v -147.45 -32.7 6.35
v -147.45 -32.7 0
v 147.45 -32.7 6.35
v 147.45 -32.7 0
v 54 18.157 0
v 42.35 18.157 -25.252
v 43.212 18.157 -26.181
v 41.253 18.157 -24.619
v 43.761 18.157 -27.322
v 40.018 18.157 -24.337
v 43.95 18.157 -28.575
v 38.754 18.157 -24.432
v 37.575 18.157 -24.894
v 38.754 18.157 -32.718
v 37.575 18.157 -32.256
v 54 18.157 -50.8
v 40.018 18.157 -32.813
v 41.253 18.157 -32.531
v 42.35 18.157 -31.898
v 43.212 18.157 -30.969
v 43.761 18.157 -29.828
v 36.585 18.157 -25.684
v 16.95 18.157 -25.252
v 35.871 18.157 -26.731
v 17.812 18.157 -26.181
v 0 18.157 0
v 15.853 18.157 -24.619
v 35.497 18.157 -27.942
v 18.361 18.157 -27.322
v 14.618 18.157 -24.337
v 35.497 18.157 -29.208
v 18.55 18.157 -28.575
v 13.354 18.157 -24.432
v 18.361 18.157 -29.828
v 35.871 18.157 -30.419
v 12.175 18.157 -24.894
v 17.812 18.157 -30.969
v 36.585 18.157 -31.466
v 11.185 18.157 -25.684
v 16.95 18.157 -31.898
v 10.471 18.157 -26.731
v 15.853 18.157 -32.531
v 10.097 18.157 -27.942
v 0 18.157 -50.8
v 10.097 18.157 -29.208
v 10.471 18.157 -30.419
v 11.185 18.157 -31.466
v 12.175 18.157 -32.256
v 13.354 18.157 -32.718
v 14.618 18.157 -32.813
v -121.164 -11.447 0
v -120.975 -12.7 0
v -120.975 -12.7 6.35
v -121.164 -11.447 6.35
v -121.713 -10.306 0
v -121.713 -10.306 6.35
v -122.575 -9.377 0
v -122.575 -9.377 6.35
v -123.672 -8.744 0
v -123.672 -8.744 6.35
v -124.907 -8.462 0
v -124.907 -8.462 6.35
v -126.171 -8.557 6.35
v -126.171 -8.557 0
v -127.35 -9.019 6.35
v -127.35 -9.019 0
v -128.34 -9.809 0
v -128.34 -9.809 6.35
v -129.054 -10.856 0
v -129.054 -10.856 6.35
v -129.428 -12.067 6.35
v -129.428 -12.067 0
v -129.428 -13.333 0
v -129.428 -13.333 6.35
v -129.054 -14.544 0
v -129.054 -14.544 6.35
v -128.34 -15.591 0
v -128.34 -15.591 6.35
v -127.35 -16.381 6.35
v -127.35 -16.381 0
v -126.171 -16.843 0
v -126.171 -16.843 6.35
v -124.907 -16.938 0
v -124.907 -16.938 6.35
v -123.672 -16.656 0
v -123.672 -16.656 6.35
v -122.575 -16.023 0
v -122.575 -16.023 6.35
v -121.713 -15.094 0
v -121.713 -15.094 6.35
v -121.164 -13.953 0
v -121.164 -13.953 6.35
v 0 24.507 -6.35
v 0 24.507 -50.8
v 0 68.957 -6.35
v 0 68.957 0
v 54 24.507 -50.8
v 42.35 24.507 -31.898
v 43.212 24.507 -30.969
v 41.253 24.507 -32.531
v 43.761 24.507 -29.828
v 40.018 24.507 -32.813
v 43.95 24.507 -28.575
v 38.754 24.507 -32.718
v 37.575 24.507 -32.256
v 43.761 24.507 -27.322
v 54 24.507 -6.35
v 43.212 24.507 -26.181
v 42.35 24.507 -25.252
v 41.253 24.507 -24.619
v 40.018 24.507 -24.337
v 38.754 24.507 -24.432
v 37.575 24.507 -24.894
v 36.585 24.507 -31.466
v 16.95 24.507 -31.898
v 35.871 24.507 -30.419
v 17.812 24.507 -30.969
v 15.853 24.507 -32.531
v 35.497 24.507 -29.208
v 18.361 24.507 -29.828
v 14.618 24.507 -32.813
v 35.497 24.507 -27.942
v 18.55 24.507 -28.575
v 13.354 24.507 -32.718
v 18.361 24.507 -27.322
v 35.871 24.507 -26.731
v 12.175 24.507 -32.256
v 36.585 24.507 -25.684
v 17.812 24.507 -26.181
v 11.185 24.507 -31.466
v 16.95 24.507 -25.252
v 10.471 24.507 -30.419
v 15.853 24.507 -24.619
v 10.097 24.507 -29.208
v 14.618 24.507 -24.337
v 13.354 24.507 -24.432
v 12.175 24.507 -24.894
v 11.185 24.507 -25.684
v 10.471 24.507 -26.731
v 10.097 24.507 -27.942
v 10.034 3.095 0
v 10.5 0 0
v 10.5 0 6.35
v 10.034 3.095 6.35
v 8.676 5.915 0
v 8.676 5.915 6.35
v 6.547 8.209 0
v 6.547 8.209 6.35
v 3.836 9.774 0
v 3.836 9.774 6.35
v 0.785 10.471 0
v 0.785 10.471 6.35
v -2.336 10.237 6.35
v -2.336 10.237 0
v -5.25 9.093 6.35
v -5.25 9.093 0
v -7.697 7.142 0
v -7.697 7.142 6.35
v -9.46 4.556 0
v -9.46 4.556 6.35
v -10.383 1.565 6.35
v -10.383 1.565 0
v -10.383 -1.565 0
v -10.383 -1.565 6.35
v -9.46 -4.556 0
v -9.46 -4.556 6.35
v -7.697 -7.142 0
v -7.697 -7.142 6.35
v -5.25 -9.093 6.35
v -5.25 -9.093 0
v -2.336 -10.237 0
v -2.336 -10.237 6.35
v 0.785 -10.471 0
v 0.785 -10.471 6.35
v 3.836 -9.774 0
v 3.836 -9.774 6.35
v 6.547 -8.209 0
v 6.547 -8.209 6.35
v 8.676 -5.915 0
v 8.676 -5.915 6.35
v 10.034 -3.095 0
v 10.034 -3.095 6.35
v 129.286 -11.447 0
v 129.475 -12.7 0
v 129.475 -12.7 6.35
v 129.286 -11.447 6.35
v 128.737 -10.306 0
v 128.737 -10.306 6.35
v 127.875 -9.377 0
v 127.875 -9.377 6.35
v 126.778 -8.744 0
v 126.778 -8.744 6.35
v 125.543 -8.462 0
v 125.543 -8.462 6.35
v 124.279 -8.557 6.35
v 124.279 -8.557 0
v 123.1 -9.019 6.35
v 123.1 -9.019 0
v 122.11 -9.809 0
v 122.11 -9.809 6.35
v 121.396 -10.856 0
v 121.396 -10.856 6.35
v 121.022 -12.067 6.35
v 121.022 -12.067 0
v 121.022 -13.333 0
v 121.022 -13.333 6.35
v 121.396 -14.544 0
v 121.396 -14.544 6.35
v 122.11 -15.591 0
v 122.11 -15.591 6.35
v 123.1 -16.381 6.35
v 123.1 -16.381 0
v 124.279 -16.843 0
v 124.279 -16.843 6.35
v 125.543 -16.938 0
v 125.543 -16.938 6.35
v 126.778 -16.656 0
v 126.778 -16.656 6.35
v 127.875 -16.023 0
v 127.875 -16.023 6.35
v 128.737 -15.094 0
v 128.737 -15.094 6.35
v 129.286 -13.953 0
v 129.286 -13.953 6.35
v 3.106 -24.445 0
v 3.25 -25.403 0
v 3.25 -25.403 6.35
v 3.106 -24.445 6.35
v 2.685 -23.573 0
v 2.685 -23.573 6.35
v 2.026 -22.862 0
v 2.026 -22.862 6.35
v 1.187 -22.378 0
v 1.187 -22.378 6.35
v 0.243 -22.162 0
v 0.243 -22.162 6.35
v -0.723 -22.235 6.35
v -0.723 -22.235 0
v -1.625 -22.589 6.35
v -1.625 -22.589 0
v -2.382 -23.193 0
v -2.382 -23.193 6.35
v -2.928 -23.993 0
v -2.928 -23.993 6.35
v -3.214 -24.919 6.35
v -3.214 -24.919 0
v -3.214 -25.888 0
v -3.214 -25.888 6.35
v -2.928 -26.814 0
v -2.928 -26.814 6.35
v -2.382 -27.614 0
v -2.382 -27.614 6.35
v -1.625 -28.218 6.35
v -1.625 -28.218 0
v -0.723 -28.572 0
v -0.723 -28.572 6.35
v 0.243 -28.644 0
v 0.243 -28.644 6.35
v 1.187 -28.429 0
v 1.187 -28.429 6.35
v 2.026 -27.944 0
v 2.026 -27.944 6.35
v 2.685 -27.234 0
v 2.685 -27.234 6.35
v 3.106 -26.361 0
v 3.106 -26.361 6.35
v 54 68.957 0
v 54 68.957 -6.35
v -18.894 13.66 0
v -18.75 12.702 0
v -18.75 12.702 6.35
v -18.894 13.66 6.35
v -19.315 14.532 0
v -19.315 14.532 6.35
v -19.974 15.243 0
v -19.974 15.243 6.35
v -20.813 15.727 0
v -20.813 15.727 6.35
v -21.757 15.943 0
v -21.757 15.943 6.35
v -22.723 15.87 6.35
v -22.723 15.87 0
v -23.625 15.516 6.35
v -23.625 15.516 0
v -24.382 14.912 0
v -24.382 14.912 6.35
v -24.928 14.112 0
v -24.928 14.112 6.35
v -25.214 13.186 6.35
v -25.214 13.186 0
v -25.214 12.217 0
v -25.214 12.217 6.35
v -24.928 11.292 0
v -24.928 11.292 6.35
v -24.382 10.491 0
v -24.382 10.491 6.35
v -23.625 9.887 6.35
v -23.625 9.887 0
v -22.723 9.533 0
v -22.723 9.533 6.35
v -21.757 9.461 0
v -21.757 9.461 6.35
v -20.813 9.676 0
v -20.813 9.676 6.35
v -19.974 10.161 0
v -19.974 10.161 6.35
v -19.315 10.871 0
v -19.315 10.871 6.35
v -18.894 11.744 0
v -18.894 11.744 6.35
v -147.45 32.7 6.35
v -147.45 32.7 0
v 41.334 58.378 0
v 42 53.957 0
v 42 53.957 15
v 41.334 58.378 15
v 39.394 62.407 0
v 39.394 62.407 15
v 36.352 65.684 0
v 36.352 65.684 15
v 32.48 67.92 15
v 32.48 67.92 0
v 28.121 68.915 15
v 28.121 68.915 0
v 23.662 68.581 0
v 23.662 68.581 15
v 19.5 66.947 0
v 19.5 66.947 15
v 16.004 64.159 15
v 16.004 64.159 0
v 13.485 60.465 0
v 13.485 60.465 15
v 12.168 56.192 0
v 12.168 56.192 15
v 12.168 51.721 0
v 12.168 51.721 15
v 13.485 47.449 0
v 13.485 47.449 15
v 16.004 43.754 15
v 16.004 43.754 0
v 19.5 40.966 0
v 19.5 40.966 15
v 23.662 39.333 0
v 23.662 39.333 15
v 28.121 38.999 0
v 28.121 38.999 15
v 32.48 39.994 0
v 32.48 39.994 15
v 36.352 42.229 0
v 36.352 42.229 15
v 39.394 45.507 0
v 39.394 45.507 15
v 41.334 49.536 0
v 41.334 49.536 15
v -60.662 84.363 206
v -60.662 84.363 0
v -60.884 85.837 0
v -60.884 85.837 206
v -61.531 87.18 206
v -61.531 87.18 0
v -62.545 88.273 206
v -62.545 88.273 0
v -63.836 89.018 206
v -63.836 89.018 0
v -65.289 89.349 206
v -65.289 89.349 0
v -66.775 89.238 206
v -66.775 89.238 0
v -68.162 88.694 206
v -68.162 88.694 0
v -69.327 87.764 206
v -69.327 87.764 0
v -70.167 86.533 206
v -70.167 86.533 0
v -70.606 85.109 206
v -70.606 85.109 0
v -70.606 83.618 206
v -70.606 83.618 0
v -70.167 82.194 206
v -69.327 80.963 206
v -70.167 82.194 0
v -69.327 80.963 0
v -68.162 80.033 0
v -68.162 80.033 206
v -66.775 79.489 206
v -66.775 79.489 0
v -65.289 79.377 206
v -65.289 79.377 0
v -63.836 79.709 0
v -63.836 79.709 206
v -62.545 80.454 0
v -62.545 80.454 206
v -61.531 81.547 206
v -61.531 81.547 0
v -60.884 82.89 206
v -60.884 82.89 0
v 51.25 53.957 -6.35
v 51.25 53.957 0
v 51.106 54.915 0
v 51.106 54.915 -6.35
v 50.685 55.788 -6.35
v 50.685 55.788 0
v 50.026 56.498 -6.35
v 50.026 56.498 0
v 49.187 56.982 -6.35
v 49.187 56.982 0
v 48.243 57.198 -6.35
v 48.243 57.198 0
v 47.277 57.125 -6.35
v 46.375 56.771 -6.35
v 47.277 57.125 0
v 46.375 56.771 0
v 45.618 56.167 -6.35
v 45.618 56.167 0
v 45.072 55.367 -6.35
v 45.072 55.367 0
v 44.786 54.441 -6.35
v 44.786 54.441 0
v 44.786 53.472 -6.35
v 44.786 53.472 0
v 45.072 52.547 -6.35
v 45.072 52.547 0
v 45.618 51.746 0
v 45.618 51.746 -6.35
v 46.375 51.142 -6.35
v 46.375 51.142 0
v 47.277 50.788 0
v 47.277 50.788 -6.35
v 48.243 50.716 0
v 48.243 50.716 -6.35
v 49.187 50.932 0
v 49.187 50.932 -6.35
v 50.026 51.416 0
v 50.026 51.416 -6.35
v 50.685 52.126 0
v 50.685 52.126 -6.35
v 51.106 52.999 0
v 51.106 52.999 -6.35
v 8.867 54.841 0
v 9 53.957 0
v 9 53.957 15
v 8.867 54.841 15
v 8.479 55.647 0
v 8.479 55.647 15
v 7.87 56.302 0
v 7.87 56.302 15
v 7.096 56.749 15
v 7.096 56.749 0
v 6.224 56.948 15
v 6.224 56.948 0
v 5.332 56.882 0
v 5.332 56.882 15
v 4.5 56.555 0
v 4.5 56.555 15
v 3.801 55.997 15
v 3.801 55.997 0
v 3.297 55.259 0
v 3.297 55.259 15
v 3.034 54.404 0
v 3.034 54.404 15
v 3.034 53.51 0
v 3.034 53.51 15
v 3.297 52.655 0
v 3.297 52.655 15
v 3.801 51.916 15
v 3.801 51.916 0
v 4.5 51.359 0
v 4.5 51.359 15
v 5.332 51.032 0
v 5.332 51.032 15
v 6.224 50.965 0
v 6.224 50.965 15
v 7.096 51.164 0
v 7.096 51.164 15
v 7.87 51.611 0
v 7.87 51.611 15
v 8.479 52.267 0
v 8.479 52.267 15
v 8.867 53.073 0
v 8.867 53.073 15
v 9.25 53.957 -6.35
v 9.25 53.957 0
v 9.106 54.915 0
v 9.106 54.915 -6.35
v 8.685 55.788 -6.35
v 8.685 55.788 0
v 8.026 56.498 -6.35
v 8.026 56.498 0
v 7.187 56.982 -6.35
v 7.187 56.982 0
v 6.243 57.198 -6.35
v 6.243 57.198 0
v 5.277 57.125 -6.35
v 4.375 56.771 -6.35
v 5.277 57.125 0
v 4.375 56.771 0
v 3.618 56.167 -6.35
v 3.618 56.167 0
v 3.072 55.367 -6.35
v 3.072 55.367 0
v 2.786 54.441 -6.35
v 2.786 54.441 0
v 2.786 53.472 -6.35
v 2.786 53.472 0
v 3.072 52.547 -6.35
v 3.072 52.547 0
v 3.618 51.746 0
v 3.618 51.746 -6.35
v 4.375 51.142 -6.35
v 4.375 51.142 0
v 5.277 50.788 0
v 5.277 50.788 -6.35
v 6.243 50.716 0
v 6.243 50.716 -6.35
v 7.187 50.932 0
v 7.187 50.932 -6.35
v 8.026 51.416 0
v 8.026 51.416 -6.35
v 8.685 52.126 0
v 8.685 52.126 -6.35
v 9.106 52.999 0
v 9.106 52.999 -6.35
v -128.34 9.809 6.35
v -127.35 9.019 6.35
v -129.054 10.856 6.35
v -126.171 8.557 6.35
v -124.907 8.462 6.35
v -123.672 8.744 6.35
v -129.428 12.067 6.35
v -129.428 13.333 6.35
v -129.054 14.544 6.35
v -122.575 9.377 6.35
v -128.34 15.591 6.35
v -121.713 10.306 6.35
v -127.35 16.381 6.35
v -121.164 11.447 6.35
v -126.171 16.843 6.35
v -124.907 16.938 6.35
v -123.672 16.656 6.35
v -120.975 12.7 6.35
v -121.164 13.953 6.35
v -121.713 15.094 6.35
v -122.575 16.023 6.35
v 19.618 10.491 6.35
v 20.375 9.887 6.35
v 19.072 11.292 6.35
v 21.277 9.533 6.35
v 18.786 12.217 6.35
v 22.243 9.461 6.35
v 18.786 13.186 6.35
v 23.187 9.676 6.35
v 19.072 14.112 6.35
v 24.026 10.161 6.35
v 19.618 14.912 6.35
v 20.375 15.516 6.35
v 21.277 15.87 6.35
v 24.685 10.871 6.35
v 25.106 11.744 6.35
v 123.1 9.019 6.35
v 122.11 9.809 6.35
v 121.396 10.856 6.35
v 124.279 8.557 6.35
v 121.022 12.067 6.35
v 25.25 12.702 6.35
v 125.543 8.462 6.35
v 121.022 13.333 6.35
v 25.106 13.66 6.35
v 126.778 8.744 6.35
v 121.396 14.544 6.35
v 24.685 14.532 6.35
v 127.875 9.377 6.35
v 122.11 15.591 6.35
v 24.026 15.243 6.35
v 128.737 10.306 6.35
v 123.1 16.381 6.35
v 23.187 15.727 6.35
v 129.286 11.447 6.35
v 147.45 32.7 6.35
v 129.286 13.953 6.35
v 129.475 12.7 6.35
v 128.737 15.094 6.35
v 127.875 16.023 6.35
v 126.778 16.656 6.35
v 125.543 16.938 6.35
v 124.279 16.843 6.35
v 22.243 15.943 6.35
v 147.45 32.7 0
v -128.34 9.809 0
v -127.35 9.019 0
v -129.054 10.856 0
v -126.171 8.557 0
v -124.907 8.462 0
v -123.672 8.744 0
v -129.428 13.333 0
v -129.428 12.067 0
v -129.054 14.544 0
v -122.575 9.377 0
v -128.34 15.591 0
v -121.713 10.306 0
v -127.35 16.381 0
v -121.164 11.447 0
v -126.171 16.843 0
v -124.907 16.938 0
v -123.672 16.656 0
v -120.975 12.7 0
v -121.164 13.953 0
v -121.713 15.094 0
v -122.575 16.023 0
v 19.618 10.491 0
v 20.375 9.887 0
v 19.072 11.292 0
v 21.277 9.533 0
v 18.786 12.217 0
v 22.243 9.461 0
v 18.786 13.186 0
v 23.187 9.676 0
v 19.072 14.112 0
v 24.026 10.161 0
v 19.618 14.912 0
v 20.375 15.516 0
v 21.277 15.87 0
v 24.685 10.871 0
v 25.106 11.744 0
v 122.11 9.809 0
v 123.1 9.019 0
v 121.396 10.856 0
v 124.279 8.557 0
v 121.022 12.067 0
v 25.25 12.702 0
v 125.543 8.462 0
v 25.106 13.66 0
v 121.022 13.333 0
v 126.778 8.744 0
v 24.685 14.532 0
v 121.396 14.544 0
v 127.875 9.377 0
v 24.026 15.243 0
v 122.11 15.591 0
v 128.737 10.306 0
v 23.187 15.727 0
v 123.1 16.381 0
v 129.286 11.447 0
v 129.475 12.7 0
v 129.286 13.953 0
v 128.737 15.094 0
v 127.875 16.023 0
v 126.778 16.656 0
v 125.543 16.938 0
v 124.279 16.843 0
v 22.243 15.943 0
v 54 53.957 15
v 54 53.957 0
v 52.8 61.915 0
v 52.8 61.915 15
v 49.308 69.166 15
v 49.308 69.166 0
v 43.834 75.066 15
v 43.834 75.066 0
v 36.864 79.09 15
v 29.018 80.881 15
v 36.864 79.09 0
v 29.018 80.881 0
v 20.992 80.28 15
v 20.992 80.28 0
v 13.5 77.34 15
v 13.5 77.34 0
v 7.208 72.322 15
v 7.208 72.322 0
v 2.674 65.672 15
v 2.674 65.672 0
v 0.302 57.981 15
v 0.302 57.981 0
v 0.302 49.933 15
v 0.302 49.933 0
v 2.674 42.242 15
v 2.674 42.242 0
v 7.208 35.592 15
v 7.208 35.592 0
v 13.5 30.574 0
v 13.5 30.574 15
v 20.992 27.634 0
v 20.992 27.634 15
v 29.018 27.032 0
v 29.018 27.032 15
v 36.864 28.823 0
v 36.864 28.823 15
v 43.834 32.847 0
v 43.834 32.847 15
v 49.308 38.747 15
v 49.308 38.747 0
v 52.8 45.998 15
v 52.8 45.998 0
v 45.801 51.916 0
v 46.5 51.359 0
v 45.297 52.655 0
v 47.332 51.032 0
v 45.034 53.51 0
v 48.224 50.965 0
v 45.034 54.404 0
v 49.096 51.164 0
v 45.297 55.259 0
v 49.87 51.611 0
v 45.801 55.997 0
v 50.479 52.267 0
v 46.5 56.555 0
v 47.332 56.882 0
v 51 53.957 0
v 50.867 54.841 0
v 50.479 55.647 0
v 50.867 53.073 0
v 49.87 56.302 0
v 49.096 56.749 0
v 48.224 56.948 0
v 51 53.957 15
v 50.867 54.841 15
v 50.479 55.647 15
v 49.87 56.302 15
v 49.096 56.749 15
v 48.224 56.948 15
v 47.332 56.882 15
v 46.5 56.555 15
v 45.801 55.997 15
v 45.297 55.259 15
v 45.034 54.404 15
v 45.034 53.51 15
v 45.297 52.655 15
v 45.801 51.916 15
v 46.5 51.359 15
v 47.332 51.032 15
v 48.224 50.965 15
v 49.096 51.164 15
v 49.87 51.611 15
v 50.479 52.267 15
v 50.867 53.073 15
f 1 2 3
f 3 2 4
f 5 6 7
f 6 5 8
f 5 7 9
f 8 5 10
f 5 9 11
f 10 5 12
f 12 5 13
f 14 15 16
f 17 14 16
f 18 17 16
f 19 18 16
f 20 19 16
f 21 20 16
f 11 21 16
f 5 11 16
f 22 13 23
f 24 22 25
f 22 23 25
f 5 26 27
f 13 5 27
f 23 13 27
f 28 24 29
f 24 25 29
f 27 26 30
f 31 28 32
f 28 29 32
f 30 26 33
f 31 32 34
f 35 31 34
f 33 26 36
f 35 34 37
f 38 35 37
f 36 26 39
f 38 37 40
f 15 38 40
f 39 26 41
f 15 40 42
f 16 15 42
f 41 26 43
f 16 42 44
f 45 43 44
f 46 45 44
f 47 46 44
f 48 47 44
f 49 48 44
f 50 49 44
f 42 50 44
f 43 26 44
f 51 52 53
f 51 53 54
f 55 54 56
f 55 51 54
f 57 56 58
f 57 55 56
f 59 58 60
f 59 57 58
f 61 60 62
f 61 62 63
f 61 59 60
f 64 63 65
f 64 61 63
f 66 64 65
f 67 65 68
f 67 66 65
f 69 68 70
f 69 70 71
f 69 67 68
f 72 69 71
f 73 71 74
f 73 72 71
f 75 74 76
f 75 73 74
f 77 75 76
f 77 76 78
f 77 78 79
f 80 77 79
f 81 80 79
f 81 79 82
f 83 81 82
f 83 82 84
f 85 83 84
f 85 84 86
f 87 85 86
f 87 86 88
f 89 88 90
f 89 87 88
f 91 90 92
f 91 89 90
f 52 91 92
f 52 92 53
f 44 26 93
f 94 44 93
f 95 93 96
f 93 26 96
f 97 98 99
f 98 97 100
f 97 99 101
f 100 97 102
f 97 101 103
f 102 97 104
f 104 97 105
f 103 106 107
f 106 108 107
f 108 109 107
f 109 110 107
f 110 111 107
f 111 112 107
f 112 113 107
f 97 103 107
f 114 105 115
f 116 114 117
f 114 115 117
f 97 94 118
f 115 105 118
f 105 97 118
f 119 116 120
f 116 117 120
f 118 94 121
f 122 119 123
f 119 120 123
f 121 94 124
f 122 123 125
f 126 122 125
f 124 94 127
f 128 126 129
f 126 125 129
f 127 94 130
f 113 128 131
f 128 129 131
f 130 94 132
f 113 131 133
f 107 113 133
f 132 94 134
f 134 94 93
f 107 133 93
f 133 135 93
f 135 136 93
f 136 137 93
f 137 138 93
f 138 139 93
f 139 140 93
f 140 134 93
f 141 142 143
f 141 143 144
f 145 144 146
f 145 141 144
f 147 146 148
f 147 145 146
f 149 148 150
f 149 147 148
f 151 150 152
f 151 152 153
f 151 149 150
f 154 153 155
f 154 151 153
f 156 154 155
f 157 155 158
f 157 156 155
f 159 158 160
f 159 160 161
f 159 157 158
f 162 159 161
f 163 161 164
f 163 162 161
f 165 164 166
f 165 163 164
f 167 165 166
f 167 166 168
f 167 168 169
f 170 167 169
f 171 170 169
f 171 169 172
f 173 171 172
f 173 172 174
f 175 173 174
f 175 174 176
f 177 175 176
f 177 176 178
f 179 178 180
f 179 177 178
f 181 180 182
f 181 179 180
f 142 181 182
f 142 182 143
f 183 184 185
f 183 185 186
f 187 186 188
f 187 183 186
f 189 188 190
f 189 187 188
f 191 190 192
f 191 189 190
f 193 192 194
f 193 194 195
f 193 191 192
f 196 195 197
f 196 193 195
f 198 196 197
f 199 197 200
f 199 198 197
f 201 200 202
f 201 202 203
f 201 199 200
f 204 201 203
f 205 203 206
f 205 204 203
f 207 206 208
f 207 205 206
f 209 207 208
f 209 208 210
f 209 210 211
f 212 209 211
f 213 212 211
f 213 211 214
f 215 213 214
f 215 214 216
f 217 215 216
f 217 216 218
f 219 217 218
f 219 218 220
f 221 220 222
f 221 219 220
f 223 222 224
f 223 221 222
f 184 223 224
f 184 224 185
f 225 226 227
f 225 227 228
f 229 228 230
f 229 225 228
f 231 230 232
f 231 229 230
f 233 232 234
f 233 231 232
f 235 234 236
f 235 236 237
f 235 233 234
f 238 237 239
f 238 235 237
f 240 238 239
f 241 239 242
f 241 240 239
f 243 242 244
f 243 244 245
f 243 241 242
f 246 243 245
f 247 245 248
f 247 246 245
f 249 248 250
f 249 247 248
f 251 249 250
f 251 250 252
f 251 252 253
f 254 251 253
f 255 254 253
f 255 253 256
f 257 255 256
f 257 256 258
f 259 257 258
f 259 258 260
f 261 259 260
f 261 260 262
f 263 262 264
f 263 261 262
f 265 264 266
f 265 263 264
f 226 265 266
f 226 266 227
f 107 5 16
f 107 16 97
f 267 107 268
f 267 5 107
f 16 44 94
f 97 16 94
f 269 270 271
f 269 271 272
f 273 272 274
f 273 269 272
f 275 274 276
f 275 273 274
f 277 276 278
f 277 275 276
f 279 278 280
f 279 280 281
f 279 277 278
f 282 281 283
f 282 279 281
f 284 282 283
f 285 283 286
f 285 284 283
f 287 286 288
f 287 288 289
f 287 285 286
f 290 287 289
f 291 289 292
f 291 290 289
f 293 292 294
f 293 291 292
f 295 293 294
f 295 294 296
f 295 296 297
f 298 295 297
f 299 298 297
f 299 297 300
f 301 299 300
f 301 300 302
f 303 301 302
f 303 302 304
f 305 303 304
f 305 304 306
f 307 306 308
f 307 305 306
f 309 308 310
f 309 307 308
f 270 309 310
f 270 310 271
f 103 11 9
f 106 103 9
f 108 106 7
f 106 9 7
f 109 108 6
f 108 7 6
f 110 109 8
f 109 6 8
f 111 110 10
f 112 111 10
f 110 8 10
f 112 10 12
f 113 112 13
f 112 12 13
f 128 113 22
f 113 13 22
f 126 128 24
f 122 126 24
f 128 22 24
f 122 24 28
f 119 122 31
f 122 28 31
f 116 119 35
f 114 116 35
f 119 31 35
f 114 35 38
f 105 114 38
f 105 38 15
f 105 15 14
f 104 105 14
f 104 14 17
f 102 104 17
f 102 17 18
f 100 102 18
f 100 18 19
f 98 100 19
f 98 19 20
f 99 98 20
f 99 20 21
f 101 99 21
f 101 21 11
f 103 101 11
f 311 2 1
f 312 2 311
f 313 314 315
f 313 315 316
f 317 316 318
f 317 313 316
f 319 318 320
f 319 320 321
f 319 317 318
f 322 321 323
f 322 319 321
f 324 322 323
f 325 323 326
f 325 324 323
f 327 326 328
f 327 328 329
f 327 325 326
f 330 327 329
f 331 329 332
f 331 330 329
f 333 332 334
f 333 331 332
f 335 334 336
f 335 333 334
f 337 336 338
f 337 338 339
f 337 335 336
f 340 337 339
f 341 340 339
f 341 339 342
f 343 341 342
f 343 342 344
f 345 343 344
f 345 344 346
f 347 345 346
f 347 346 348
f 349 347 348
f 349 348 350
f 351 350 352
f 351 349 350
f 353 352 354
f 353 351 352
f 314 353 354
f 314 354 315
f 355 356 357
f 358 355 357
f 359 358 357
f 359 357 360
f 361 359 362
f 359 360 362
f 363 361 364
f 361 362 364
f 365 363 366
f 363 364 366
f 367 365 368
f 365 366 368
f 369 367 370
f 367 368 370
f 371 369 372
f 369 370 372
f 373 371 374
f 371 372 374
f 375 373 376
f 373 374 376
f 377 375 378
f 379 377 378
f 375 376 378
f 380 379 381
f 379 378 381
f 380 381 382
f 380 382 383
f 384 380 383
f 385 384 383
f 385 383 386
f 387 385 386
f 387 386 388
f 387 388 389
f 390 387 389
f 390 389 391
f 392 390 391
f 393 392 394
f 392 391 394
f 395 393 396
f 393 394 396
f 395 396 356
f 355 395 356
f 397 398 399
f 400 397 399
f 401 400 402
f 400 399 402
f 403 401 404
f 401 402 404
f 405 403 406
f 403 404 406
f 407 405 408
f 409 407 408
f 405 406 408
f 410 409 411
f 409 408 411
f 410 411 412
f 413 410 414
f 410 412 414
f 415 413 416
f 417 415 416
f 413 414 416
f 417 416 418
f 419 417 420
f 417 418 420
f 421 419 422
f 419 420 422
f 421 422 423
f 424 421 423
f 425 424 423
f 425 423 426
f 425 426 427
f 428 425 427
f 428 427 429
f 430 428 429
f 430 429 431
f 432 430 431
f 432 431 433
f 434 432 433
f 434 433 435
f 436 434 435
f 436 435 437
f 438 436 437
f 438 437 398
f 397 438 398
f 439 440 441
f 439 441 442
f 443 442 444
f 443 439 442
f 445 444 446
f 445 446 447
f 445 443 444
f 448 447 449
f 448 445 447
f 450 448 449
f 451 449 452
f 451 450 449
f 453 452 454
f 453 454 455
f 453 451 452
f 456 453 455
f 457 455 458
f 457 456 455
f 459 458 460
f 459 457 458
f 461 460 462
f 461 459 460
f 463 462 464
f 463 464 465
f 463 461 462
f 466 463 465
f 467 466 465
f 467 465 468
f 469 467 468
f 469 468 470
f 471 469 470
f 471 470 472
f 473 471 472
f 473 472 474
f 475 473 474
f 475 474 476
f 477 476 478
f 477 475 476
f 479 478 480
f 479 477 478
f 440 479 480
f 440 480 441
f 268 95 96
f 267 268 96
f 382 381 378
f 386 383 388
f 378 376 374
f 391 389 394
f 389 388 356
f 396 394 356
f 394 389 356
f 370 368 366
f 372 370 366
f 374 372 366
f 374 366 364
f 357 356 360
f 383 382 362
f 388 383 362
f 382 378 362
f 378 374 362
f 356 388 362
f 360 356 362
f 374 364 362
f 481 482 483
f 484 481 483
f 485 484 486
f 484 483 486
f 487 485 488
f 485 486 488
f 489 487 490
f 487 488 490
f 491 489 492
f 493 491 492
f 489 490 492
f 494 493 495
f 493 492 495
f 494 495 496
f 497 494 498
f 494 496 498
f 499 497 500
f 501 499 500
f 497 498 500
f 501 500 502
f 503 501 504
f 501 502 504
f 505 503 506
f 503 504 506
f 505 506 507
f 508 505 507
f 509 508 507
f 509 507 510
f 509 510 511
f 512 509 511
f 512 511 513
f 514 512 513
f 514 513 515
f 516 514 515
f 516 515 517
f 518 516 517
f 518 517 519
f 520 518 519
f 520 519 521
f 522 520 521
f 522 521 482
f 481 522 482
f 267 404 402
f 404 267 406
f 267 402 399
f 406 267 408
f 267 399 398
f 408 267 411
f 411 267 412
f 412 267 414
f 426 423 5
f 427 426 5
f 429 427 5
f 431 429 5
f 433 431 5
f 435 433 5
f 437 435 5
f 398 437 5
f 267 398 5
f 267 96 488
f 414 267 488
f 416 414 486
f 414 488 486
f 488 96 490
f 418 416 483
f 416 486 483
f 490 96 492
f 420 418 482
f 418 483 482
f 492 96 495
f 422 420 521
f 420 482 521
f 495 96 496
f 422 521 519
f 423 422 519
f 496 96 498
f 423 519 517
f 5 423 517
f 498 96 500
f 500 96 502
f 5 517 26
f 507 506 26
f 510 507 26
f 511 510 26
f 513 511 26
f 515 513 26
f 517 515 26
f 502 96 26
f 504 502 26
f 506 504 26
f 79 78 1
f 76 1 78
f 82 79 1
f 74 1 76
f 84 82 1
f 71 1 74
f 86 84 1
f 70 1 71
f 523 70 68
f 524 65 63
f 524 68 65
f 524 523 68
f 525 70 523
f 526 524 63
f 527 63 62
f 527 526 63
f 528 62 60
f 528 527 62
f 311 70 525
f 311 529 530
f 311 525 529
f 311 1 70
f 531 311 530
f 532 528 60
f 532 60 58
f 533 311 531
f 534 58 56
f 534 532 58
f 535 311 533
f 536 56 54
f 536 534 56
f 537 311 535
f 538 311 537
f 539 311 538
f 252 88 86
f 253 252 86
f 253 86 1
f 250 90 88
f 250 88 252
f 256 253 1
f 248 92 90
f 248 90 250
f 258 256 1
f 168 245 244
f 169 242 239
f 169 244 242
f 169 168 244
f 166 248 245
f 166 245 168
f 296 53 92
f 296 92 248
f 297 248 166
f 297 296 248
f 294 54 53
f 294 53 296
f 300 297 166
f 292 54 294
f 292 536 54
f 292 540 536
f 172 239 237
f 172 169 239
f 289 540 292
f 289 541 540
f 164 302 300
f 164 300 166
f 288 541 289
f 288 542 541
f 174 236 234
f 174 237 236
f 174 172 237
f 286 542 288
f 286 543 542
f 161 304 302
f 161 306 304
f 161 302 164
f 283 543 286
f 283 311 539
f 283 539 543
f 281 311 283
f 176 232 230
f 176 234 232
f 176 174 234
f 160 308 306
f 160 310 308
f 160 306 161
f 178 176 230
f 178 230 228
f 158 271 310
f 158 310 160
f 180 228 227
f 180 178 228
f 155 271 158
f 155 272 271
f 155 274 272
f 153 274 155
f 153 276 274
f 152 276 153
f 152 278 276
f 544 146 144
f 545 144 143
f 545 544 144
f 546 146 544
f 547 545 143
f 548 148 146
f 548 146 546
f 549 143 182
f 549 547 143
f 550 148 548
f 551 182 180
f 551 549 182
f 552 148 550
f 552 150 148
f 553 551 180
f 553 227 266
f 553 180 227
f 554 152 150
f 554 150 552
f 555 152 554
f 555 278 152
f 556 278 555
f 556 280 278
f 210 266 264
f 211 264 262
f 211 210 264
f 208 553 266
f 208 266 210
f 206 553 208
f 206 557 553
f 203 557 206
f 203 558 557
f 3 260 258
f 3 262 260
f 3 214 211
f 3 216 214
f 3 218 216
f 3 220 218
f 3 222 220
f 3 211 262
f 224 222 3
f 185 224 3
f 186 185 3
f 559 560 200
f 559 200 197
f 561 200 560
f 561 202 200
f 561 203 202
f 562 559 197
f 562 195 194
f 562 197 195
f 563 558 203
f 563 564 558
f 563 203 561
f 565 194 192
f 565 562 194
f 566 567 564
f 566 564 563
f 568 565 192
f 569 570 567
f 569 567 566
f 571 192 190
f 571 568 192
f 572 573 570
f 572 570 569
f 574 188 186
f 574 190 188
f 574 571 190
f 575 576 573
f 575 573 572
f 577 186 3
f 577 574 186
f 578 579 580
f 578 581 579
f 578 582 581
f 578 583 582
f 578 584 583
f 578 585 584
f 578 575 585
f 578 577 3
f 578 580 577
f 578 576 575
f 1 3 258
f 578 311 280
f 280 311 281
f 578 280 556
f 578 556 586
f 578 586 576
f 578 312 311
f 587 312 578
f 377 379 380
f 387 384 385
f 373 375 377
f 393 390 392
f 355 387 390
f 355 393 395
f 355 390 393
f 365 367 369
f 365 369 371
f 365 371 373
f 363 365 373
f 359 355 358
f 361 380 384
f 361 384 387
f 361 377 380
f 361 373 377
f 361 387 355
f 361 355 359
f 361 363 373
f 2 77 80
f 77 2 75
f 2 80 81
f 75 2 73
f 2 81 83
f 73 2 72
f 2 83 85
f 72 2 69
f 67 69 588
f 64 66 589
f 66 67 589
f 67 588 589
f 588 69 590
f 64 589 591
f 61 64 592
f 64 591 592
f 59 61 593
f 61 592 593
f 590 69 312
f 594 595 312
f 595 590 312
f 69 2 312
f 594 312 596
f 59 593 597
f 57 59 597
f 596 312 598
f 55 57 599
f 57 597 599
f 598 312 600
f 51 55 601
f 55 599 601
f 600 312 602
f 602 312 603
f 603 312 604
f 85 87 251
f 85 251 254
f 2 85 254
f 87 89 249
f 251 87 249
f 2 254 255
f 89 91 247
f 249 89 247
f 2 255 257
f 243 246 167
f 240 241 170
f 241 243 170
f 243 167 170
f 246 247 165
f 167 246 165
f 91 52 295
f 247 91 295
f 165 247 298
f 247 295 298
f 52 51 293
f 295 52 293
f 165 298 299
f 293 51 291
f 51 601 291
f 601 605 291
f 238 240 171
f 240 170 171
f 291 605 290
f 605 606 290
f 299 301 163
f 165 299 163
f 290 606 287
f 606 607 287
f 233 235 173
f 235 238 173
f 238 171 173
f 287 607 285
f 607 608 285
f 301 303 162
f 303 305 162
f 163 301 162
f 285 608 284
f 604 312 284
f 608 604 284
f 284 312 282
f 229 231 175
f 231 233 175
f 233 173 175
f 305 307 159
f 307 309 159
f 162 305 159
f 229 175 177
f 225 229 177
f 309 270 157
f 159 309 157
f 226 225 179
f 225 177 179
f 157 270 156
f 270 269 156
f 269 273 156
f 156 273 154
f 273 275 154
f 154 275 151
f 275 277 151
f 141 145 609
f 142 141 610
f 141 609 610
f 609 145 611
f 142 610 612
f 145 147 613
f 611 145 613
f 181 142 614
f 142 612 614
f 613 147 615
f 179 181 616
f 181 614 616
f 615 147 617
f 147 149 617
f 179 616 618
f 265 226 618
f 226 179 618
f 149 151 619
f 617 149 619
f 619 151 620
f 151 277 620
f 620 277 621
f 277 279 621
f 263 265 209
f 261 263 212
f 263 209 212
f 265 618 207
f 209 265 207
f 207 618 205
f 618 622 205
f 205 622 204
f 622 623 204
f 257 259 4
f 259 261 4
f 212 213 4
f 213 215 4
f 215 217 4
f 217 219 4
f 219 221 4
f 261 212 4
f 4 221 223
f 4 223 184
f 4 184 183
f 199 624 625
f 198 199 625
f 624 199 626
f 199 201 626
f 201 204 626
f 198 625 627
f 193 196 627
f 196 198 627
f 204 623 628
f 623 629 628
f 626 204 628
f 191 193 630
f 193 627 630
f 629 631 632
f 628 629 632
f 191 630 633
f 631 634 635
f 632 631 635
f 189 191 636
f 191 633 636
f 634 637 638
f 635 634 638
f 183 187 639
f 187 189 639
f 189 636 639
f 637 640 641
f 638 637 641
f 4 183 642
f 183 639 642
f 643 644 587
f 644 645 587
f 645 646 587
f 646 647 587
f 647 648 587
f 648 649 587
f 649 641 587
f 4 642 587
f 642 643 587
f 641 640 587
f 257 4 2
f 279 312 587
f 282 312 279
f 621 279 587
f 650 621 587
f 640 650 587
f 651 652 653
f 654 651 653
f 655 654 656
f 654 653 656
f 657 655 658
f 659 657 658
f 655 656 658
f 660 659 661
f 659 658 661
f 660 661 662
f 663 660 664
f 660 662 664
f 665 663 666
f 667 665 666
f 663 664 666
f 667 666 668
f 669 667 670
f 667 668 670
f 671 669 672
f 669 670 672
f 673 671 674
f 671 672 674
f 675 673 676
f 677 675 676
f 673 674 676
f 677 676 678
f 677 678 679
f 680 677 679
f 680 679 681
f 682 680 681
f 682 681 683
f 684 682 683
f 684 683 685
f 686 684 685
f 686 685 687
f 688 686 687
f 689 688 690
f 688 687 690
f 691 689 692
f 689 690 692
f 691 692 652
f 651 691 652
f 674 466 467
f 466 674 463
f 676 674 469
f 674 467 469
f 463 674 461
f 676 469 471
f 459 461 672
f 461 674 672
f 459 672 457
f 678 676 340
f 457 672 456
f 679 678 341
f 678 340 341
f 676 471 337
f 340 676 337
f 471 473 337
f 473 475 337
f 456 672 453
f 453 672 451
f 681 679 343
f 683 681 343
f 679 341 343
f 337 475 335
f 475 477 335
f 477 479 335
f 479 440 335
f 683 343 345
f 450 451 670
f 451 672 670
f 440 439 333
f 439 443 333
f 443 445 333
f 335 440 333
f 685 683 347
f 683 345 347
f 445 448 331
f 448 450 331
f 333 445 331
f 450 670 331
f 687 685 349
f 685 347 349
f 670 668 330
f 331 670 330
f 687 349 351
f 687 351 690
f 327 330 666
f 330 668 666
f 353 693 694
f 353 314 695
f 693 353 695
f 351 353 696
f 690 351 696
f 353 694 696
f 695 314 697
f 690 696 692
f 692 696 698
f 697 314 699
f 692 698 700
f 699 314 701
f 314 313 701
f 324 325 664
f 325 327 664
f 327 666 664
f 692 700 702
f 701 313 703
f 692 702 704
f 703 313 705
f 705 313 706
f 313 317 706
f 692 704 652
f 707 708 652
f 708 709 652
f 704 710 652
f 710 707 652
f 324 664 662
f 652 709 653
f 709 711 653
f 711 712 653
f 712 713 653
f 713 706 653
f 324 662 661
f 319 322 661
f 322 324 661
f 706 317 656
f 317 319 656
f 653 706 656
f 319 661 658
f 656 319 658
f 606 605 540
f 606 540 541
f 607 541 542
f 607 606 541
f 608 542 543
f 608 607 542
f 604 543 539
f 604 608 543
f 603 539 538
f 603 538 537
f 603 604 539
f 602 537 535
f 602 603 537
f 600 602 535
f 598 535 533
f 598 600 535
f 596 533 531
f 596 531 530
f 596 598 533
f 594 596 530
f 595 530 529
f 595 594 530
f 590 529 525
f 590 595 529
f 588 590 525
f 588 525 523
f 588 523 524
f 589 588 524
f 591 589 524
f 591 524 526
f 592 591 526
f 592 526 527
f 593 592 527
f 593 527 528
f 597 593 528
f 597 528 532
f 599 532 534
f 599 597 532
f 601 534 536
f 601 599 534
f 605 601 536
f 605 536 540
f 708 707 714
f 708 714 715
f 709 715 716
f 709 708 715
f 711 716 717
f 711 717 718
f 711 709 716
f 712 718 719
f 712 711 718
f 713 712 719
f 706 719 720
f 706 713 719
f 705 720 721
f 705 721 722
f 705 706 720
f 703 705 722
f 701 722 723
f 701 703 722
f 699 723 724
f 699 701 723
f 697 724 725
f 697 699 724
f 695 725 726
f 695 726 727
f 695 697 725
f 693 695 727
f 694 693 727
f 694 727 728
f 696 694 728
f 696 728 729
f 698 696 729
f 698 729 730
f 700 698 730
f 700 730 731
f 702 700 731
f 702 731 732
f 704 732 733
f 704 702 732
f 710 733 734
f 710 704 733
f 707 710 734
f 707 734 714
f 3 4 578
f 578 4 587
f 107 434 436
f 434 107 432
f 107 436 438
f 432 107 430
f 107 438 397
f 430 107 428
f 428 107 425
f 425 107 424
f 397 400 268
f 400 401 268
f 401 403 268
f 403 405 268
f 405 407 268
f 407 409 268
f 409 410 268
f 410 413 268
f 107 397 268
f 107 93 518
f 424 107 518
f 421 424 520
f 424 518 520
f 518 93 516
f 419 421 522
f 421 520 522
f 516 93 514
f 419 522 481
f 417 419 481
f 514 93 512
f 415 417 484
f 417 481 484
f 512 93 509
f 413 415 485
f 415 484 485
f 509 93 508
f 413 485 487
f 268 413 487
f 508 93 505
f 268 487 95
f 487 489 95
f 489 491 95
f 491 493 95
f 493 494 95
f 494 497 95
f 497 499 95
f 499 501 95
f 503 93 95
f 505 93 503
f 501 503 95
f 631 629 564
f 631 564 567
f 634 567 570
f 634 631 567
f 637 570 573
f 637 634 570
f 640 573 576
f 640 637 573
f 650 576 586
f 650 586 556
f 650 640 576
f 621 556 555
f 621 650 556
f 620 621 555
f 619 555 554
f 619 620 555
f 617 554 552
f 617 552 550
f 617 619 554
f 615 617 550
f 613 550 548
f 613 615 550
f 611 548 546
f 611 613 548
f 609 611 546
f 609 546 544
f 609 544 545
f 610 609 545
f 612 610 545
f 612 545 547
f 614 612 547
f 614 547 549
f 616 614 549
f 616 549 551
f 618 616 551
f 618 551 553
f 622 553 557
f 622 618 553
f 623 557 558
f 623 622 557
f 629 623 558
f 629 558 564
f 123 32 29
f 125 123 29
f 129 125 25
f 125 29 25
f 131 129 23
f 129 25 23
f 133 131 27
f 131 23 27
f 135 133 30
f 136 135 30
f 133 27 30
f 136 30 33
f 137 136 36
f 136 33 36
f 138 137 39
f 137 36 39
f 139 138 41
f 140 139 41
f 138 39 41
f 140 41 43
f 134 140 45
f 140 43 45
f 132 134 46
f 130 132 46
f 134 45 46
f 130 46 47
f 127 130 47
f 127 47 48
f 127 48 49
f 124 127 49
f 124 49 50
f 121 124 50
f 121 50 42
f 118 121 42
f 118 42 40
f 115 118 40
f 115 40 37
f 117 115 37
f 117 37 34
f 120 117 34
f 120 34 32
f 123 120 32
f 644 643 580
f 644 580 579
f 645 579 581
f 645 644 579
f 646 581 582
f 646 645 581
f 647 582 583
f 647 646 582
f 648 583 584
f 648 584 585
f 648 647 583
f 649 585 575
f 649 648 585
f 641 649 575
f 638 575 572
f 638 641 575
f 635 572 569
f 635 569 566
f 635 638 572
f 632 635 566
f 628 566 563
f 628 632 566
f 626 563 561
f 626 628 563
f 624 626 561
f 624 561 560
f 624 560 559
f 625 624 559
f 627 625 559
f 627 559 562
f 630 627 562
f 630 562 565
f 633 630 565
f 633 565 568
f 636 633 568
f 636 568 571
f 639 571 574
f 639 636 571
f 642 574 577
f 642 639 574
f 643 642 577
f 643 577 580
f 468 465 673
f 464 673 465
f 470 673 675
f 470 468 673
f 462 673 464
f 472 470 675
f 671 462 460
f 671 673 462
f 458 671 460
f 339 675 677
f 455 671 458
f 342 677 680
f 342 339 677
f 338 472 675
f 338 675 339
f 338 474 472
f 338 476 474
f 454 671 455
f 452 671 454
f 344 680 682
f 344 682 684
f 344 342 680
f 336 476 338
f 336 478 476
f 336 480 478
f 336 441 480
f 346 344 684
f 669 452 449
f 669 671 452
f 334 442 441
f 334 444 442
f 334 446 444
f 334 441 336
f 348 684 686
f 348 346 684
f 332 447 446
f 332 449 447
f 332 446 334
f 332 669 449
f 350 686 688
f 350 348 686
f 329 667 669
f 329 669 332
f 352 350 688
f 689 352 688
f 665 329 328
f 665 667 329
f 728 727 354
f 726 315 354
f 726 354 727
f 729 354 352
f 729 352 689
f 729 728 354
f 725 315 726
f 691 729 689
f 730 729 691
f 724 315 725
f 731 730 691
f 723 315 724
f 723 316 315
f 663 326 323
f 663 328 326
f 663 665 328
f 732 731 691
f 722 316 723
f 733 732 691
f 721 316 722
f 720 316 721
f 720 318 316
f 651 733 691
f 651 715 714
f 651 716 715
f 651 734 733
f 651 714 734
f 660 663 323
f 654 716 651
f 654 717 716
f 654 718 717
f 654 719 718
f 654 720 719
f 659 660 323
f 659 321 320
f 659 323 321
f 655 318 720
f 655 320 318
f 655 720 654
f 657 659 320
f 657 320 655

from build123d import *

# Parameters (mm, degrees)
F1_R      = 27
F1_R_2    = 3
F1_R_3    = 15
F2_DEPTH  = 15
F3_R      = 5
F4_DEPTH  = 206
F6_DEPTH  = 54
F7_R      = 3.25
F8_DEPTH  = 25
F9_R      = 4.25
F10_DEPTH = 25
F0_W      = 294.9
F0_H      = 65.4
F0_R      = 3.25
F0_R_2    = 4.25
F0_R_3    = 10.5
F11_DEPTH = 6.35


# Not quite as in the source:
# - a length typed as a fraction of an inch, garbled in the dataset ("3 / 203.2 mm" for 3/8 in), is restored


with BuildPart() as f2:
    # F1 (on Top) → F2 (new body)
    with BuildSketch(Plane.XY):
        with Locations((27, 53.9568550885)):
            Circle(F1_R)
        with Locations((6, 53.9568550885)):
            Circle(F1_R_2, mode=Mode.SUBTRACT)
        with Locations((27, 53.9568550885)):
            Circle(F1_R_3, mode=Mode.SUBTRACT)
        with Locations((48, 53.9568550885)):
            Circle(F1_R_2, mode=Mode.SUBTRACT)
    extrude(amount=F2_DEPTH)


with BuildPart() as f4:
    # F3 (on Top) → F4 (new body)
    with BuildSketch(Plane.XY):
        with Locations((-65.662227571, 84.3633785844)):
            Circle(F3_R)
    extrude(amount=F4_DEPTH)


with BuildPart() as f6:
    # F5 (on Right) → F6 (new body)
    with BuildSketch(Plane.YZ):
        Polygon((68.9568550885, -6.35), (68.9568550885, 0), (18.1568550885, 0), (18.1568550885, -50.8), (24.5068550885, -50.8), (24.5068550885, -6.35), align=None)
    extrude(amount=F6_DEPTH)

    # F7 (on face) → F8 (cut)
    with BuildSketch(Plane.XY):
        with Locations((6, 53.9568550885)):
            Circle(F7_R)
        with Locations((48, 53.9568550885)):
            Circle(F7_R)
    extrude(amount=-F8_DEPTH, mode=Mode.SUBTRACT)

    # F9 (on face) → F10 (cut)
    with BuildSketch(Plane.XZ.offset(-18.1568550885)):
        with Locations((14.3, -28.575)):
            Circle(F9_R)
        with Locations((39.7, -28.575)):
            Circle(F9_R)
    extrude(amount=-F10_DEPTH, mode=Mode.SUBTRACT)


with BuildPart() as f11:
    # F0 (on Top) → F11 (new body)
    with BuildSketch(Plane.XY):
        Rectangle(F0_W, F0_H)
        with Locations((0, -25.4034118443)):
            Circle(F0_R, mode=Mode.SUBTRACT)
        with Locations((-125.225, -12.7)):
            Circle(F0_R_2, mode=Mode.SUBTRACT)
        with Locations((125.225, -12.7)):
            Circle(F0_R_2, mode=Mode.SUBTRACT)
        with Locations((-125.225, 12.7)):
            Circle(F0_R_2, mode=Mode.SUBTRACT)
        Circle(F0_R_3, mode=Mode.SUBTRACT)
        with Locations((-22, 12.7017059222)):
            Circle(F0_R, mode=Mode.SUBTRACT)
        with Locations((22, 12.7017059222)):
            Circle(F0_R, mode=Mode.SUBTRACT)
        with Locations((125.225, 12.7)):
            Circle(F0_R_2, mode=Mode.SUBTRACT)
    extrude(amount=F11_DEPTH)


solid = Compound([f2.part, f4.part, f6.part, f11.part])
